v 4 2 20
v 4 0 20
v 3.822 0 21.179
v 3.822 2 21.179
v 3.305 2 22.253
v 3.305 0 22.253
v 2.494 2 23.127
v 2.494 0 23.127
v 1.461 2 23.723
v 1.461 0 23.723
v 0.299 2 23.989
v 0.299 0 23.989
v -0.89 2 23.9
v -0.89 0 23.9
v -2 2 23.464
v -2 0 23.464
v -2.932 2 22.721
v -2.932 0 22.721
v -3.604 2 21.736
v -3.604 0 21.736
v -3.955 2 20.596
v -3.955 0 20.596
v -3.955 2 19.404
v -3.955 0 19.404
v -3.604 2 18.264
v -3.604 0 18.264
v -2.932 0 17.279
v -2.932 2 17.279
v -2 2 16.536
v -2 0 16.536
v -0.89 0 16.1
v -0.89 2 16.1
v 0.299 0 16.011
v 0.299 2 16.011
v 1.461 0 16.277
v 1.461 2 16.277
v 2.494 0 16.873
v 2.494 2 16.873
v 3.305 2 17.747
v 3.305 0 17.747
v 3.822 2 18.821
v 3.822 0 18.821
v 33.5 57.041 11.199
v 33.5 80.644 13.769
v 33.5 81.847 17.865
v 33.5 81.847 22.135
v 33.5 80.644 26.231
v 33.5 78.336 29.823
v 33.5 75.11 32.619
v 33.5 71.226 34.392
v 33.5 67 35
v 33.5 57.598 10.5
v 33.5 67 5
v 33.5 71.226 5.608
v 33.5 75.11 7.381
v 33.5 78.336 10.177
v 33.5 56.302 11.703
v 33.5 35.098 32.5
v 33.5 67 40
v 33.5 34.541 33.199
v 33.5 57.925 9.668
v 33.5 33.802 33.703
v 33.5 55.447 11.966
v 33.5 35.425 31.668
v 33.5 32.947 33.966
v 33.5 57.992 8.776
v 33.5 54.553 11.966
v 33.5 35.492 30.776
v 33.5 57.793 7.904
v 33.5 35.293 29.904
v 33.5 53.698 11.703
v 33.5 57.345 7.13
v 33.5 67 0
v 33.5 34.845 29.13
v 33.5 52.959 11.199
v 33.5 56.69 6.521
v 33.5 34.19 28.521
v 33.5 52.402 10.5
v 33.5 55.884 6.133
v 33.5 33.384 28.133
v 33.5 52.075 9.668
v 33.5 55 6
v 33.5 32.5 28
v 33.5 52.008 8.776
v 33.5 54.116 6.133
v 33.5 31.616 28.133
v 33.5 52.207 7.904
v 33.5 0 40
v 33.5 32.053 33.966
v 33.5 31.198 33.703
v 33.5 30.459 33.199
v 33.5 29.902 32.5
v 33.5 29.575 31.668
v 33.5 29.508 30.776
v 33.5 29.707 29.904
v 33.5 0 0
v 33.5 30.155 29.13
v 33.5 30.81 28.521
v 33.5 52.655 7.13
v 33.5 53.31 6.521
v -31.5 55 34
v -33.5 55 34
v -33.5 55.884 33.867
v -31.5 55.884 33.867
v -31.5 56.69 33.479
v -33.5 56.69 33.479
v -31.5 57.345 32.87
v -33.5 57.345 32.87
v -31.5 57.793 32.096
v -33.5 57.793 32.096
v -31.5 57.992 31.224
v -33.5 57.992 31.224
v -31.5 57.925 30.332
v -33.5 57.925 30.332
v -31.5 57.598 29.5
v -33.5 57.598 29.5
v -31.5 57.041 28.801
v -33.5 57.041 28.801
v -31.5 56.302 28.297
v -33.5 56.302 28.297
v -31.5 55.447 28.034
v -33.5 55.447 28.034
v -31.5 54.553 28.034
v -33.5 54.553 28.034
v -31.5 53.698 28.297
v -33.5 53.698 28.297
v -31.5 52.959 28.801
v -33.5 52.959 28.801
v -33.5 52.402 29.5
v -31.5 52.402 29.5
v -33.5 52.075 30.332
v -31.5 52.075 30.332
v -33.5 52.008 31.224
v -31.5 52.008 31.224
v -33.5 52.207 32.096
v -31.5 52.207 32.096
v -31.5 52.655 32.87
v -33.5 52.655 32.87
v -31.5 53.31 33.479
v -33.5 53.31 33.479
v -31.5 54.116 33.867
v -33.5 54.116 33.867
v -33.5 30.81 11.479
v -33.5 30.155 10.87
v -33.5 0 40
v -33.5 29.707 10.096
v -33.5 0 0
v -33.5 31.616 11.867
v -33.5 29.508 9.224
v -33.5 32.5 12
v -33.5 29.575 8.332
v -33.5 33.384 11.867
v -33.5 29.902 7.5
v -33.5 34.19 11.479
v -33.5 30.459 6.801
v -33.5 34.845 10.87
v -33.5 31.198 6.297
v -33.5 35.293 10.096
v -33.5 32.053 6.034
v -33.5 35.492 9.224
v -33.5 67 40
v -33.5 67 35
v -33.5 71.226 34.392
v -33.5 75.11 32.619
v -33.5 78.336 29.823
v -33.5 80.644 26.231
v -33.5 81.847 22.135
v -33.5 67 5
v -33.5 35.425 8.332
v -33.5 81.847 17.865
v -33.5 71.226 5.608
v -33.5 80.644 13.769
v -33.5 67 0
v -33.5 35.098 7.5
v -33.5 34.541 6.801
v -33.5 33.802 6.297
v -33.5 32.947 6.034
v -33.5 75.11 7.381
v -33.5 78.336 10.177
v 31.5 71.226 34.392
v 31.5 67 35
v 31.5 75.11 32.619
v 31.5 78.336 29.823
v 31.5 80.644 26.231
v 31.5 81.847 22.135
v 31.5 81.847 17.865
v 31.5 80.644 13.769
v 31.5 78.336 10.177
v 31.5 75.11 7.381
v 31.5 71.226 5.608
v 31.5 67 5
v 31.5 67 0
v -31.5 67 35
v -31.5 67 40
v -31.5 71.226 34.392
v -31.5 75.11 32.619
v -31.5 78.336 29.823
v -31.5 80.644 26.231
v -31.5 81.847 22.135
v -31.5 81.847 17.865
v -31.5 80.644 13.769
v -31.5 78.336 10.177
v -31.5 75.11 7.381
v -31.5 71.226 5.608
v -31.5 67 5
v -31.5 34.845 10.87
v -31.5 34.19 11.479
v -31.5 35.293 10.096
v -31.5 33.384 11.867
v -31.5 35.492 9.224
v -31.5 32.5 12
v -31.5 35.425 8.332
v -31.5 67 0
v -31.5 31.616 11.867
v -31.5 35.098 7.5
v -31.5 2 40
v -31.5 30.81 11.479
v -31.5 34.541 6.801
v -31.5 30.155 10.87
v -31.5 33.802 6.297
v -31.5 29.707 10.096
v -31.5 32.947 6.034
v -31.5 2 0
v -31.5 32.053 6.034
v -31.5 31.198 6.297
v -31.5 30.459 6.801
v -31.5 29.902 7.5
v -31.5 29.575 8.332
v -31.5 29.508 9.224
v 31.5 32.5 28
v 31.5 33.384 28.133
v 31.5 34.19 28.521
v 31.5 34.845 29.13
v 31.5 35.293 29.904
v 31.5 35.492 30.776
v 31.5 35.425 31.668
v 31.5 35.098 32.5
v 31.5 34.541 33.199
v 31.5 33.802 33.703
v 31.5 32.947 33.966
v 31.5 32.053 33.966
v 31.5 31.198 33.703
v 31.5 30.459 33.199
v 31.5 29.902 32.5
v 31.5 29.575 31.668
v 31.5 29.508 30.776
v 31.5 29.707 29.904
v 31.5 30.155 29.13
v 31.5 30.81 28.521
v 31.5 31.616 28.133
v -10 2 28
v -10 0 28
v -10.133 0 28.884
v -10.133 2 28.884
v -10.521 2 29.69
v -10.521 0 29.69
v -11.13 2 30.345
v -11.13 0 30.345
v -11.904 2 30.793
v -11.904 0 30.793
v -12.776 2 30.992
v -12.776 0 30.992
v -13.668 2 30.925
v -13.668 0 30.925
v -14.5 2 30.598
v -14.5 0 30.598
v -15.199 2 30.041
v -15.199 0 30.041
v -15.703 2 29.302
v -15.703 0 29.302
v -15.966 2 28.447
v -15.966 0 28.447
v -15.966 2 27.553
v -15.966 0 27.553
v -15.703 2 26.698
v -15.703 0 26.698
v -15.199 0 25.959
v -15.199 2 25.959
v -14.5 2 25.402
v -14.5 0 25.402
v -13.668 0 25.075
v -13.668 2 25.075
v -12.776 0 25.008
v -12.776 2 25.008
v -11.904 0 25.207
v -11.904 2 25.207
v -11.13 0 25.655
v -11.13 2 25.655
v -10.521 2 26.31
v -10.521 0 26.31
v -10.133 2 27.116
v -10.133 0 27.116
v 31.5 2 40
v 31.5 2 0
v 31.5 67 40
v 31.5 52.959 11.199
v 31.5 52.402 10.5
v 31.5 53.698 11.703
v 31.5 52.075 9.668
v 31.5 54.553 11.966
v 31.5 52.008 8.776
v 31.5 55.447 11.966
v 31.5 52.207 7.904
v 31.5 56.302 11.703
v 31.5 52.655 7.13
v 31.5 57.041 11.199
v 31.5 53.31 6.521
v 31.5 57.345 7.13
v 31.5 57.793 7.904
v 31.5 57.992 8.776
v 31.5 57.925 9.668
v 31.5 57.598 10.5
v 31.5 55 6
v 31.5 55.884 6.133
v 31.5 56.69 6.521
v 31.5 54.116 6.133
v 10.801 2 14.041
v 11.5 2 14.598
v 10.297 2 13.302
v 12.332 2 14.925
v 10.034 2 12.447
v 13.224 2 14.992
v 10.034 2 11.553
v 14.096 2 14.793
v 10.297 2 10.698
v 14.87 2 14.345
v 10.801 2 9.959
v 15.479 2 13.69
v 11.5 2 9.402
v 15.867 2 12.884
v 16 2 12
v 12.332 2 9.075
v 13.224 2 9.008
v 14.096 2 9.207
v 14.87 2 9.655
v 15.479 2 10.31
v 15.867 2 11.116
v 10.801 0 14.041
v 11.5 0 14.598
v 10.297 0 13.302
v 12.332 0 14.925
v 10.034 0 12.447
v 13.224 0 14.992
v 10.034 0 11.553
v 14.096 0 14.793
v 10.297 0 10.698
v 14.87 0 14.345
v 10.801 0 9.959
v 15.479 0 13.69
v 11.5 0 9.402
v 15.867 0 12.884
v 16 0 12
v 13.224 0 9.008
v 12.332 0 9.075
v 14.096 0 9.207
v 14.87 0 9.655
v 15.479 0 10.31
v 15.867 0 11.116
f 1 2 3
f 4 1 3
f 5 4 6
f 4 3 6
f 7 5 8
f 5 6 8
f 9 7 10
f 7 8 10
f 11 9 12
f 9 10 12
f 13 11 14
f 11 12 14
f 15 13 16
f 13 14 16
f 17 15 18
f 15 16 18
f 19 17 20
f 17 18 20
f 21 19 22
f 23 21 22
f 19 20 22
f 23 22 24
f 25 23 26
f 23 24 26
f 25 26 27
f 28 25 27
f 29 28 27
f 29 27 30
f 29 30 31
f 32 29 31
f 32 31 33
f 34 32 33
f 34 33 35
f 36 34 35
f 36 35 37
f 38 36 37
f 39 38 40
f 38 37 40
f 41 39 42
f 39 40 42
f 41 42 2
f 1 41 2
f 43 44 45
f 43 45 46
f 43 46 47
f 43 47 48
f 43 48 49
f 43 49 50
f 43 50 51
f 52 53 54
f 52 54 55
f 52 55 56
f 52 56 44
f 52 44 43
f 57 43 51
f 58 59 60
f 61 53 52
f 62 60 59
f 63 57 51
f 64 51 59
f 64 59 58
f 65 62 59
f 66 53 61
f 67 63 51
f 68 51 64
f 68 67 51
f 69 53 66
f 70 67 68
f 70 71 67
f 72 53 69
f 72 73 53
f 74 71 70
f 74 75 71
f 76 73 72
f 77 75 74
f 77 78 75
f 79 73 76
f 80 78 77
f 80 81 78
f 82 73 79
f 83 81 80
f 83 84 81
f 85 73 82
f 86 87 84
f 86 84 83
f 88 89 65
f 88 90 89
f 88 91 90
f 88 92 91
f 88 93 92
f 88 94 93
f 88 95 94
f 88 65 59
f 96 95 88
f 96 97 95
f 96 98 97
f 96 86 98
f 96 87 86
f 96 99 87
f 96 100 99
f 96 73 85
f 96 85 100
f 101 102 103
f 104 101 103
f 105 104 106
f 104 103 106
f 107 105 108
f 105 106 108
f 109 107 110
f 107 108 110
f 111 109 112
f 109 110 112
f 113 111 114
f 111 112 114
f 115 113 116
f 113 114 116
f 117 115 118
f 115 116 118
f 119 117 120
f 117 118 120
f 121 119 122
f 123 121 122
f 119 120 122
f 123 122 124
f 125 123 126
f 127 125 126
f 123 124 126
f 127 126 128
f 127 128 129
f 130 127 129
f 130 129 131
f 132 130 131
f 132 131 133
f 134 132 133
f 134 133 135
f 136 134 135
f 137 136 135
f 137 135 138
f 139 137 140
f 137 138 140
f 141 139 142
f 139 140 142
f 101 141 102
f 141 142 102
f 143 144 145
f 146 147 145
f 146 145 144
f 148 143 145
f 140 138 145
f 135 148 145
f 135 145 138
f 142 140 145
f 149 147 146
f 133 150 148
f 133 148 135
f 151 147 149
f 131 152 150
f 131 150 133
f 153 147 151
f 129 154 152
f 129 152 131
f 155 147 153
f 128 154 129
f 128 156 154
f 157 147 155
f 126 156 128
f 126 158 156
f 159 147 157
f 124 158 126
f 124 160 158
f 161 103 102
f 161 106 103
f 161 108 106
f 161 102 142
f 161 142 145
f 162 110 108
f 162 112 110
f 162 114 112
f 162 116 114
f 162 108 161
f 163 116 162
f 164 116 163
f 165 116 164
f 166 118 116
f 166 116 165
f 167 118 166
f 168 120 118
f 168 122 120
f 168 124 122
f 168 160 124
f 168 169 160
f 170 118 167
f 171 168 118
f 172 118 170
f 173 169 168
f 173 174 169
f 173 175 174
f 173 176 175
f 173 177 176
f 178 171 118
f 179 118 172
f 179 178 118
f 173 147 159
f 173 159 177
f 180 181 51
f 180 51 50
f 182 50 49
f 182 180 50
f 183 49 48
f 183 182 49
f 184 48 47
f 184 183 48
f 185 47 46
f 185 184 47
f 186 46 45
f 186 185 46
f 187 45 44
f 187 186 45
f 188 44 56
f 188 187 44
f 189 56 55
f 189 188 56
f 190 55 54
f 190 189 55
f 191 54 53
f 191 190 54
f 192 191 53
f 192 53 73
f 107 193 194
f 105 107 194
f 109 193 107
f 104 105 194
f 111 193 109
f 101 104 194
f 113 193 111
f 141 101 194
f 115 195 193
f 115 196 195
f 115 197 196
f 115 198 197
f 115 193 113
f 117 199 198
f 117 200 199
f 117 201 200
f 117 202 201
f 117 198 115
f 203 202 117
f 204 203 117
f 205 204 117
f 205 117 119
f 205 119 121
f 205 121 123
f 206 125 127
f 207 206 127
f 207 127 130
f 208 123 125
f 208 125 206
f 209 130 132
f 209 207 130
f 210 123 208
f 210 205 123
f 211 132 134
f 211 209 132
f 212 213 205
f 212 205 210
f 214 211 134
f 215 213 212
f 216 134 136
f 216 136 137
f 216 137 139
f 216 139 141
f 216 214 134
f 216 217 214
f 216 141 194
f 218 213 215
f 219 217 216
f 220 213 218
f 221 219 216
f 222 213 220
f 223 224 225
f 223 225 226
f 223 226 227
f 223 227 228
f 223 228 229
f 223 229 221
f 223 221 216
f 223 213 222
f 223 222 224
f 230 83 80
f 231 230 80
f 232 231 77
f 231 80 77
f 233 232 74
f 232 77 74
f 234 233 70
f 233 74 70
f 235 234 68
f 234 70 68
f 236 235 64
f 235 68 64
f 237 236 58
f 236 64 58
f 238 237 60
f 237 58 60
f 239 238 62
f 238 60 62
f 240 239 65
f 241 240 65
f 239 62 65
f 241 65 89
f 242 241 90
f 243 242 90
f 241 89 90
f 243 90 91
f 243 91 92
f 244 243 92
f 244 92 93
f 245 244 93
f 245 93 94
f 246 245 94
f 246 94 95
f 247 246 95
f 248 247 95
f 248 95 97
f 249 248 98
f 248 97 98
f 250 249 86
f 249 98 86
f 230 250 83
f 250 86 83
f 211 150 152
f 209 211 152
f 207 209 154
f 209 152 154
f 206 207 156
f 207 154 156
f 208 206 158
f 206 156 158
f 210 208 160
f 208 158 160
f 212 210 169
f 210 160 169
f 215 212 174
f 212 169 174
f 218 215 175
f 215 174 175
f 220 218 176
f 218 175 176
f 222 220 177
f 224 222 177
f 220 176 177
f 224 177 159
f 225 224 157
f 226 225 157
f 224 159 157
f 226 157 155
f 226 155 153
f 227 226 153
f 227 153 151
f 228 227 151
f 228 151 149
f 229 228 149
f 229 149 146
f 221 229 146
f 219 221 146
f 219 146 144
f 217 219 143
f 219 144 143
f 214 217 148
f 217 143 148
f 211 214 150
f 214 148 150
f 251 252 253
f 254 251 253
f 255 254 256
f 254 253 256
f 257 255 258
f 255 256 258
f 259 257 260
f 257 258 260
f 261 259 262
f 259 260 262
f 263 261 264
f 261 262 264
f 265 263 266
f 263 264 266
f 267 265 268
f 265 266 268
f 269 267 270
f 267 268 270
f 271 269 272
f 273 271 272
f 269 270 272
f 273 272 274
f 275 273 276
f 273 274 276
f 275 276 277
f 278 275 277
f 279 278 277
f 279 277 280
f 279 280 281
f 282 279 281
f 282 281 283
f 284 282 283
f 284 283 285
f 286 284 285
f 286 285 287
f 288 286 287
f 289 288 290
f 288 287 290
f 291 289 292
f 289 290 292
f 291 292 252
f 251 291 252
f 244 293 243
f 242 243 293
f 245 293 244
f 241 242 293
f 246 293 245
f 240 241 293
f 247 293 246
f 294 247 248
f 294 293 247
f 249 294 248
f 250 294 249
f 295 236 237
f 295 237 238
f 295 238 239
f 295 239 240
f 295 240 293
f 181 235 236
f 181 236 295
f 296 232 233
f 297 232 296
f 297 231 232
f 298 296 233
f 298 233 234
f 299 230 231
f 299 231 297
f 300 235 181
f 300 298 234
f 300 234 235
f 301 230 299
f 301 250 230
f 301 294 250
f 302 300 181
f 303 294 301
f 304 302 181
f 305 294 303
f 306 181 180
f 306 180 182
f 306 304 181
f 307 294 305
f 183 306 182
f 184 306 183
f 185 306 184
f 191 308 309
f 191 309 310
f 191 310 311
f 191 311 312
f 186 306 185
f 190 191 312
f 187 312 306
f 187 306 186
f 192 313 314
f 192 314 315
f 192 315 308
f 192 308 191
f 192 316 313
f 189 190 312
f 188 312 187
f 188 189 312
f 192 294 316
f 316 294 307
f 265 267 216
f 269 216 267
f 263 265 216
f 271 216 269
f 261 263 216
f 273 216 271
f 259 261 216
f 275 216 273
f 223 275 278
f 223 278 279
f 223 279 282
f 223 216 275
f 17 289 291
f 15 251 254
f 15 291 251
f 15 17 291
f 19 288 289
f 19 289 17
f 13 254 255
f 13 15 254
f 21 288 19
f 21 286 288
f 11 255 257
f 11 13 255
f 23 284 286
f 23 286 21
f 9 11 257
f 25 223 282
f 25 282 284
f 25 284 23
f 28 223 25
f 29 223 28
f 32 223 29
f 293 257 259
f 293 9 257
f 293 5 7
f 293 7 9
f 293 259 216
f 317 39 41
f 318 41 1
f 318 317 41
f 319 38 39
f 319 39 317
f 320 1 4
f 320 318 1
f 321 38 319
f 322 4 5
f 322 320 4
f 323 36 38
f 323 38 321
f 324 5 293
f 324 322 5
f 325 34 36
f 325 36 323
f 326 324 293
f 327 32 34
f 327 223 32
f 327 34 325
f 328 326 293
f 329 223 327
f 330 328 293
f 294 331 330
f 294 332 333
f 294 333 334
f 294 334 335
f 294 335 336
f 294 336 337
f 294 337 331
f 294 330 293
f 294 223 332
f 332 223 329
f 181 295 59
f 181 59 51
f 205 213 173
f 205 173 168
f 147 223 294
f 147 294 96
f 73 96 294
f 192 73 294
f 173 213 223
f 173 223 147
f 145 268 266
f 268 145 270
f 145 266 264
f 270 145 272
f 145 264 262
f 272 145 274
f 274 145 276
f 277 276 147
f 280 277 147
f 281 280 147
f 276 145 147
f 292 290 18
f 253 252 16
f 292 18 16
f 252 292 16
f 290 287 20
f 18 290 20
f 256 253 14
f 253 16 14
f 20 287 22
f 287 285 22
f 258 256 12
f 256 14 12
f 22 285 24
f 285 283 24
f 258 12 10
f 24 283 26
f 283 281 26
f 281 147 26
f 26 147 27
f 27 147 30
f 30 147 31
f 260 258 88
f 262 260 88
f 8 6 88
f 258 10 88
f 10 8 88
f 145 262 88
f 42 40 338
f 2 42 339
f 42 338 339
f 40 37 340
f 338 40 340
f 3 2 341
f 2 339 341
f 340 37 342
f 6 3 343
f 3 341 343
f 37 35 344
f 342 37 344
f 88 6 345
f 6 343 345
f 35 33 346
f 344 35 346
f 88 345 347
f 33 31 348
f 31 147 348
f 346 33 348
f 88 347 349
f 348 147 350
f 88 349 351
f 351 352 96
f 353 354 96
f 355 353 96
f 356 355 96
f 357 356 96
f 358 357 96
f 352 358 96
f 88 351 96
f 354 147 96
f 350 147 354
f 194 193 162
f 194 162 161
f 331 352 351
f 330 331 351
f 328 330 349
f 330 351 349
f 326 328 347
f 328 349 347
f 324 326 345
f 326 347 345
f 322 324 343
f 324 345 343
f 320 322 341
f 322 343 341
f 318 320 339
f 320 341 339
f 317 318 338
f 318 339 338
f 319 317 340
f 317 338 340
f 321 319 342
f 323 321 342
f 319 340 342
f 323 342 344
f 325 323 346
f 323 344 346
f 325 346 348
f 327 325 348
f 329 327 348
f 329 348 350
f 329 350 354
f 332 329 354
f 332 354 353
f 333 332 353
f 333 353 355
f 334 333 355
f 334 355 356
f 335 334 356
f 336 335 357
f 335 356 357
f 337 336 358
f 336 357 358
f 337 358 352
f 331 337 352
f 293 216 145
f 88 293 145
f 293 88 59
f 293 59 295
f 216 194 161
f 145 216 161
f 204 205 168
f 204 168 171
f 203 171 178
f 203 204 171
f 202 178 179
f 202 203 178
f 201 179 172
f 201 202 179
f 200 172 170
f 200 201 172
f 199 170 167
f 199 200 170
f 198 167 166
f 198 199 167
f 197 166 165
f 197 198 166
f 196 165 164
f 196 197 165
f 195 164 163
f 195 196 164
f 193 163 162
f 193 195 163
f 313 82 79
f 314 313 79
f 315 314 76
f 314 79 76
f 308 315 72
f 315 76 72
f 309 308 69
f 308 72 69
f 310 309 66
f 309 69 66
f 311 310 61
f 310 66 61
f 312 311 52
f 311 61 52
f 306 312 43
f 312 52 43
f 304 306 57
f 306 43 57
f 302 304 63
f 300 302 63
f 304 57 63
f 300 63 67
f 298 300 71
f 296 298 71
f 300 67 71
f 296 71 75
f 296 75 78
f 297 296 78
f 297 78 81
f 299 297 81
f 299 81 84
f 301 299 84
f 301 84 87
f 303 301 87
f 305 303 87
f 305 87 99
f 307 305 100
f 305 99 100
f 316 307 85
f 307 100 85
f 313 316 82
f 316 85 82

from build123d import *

# Parameters (mm, degrees)
BOSS_EXTRUDE1_DEPTH      = 40
SKETCH2_R                = 4
SKETCH2_R_2              = 3
CUT_EXTRUDE2_DEPTH       = 2
CUT_EXTRUDE8_DEPTH       = 114.194522836
CUT_EXTRUDE8_DEPTH_BACK  = 2
SKETCH5_R                = 3
CUT_EXTRUDE9_DEPTH       = 2
SKETCH6_R                = 3
CUT_EXTRUDE10_DEPTH      = 2
CUT_EXTRUDE11_DEPTH      = 114.194522836
CUT_EXTRUDE11_DEPTH_BACK = 2


with BuildPart() as part:
    # MetalPart → Boss-Extrude1 (new body)
    with BuildSketch(Plane.XY):
        Polygon((0, 0), (-33.5, 0), (-33.5, 82), (-31.5, 82), (-31.5, 2), (31.5, 2), (31.5, 82), (33.5, 82), (33.5, 0), align=None)
    extrude(amount=BOSS_EXTRUDE1_DEPTH)

    # Sketch2 → Cut-Extrude2 (cut)
    with BuildSketch(Plane.XZ):
        with Locations((0, 20)):
            Circle(SKETCH2_R)
        with Locations((-13, 28)):
            Circle(SKETCH2_R_2)
        with Locations((13, 12)):
            Circle(SKETCH2_R_2)
    extrude(amount=-CUT_EXTRUDE2_DEPTH, mode=Mode.SUBTRACT)

    # Sketch3 → Cut-Extrude8 (cut, two sides: drawn at the far end of the back side and taken through both)
    with BuildSketch(Plane(origin=(33.5, 0, 0), x_dir=(0, 0, -1), z_dir=(1, 0, 0)).offset(-CUT_EXTRUDE8_DEPTH_BACK)):
        with BuildLine():
            Line((-206.064089399, 67), (-40, 67))
            Line((-40, 67), (-35, 67))
            ThreePointArc((-35, 67), (-20, 82), (-5, 67))
            Line((-5, 67), (0, 67))
            Line((0, 67), (166.064089399, 67))
            Line((166.064089399, 67), (166.064089399, 399.128178798))
            Line((166.064089399, 399.128178798), (-206.064089399, 399.128178798))
            Line((-206.064089399, 399.128178798), (-206.064089399, 67))
        make_face()
    extrude(amount=CUT_EXTRUDE8_DEPTH + CUT_EXTRUDE8_DEPTH_BACK, mode=Mode.SUBTRACT)

    # Sketch5 → Cut-Extrude9 (cut)
    with BuildSketch(Plane(origin=(33.5, 0, 0), x_dir=(0, 0, -1), z_dir=(1, 0, 0))):
        with Locations((-9, 55)):
            Circle(SKETCH5_R)
        with Locations((-31, 32.5)):
            Circle(SKETCH5_R)
    extrude(amount=-CUT_EXTRUDE9_DEPTH, mode=Mode.SUBTRACT)

    # Sketch6 → Cut-Extrude10 (cut)
    with BuildSketch(Plane.ZY.offset(33.5)):
        with Locations((9, 32.5)):
            Circle(SKETCH6_R)
        with Locations((31, 55)):
            Circle(SKETCH6_R)
    extrude(amount=-CUT_EXTRUDE10_DEPTH, mode=Mode.SUBTRACT)

    # Sketch7 → Cut-Extrude11 (cut, two sides: drawn at the far end of the back side and taken through both)
    with BuildSketch(Plane.ZY.offset(33.5).offset(-CUT_EXTRUDE11_DEPTH_BACK)):
        with BuildLine():
            Line((-166.064089399, 67), (0, 67))
            Line((0, 67), (5, 67))
            ThreePointArc((5, 67), (20, 82), (35, 67))
            Line((35, 67), (40, 67))
            Line((40, 67), (206.064089399, 67))
            Line((206.064089399, 67), (206.064089399, 399.128178798))
            Line((206.064089399, 399.128178798), (-166.064089399, 399.128178798))
            Line((-166.064089399, 399.128178798), (-166.064089399, 67))
        make_face()
    extrude(amount=CUT_EXTRUDE11_DEPTH + CUT_EXTRUDE11_DEPTH_BACK, mode=Mode.SUBTRACT)


solid = part.part
